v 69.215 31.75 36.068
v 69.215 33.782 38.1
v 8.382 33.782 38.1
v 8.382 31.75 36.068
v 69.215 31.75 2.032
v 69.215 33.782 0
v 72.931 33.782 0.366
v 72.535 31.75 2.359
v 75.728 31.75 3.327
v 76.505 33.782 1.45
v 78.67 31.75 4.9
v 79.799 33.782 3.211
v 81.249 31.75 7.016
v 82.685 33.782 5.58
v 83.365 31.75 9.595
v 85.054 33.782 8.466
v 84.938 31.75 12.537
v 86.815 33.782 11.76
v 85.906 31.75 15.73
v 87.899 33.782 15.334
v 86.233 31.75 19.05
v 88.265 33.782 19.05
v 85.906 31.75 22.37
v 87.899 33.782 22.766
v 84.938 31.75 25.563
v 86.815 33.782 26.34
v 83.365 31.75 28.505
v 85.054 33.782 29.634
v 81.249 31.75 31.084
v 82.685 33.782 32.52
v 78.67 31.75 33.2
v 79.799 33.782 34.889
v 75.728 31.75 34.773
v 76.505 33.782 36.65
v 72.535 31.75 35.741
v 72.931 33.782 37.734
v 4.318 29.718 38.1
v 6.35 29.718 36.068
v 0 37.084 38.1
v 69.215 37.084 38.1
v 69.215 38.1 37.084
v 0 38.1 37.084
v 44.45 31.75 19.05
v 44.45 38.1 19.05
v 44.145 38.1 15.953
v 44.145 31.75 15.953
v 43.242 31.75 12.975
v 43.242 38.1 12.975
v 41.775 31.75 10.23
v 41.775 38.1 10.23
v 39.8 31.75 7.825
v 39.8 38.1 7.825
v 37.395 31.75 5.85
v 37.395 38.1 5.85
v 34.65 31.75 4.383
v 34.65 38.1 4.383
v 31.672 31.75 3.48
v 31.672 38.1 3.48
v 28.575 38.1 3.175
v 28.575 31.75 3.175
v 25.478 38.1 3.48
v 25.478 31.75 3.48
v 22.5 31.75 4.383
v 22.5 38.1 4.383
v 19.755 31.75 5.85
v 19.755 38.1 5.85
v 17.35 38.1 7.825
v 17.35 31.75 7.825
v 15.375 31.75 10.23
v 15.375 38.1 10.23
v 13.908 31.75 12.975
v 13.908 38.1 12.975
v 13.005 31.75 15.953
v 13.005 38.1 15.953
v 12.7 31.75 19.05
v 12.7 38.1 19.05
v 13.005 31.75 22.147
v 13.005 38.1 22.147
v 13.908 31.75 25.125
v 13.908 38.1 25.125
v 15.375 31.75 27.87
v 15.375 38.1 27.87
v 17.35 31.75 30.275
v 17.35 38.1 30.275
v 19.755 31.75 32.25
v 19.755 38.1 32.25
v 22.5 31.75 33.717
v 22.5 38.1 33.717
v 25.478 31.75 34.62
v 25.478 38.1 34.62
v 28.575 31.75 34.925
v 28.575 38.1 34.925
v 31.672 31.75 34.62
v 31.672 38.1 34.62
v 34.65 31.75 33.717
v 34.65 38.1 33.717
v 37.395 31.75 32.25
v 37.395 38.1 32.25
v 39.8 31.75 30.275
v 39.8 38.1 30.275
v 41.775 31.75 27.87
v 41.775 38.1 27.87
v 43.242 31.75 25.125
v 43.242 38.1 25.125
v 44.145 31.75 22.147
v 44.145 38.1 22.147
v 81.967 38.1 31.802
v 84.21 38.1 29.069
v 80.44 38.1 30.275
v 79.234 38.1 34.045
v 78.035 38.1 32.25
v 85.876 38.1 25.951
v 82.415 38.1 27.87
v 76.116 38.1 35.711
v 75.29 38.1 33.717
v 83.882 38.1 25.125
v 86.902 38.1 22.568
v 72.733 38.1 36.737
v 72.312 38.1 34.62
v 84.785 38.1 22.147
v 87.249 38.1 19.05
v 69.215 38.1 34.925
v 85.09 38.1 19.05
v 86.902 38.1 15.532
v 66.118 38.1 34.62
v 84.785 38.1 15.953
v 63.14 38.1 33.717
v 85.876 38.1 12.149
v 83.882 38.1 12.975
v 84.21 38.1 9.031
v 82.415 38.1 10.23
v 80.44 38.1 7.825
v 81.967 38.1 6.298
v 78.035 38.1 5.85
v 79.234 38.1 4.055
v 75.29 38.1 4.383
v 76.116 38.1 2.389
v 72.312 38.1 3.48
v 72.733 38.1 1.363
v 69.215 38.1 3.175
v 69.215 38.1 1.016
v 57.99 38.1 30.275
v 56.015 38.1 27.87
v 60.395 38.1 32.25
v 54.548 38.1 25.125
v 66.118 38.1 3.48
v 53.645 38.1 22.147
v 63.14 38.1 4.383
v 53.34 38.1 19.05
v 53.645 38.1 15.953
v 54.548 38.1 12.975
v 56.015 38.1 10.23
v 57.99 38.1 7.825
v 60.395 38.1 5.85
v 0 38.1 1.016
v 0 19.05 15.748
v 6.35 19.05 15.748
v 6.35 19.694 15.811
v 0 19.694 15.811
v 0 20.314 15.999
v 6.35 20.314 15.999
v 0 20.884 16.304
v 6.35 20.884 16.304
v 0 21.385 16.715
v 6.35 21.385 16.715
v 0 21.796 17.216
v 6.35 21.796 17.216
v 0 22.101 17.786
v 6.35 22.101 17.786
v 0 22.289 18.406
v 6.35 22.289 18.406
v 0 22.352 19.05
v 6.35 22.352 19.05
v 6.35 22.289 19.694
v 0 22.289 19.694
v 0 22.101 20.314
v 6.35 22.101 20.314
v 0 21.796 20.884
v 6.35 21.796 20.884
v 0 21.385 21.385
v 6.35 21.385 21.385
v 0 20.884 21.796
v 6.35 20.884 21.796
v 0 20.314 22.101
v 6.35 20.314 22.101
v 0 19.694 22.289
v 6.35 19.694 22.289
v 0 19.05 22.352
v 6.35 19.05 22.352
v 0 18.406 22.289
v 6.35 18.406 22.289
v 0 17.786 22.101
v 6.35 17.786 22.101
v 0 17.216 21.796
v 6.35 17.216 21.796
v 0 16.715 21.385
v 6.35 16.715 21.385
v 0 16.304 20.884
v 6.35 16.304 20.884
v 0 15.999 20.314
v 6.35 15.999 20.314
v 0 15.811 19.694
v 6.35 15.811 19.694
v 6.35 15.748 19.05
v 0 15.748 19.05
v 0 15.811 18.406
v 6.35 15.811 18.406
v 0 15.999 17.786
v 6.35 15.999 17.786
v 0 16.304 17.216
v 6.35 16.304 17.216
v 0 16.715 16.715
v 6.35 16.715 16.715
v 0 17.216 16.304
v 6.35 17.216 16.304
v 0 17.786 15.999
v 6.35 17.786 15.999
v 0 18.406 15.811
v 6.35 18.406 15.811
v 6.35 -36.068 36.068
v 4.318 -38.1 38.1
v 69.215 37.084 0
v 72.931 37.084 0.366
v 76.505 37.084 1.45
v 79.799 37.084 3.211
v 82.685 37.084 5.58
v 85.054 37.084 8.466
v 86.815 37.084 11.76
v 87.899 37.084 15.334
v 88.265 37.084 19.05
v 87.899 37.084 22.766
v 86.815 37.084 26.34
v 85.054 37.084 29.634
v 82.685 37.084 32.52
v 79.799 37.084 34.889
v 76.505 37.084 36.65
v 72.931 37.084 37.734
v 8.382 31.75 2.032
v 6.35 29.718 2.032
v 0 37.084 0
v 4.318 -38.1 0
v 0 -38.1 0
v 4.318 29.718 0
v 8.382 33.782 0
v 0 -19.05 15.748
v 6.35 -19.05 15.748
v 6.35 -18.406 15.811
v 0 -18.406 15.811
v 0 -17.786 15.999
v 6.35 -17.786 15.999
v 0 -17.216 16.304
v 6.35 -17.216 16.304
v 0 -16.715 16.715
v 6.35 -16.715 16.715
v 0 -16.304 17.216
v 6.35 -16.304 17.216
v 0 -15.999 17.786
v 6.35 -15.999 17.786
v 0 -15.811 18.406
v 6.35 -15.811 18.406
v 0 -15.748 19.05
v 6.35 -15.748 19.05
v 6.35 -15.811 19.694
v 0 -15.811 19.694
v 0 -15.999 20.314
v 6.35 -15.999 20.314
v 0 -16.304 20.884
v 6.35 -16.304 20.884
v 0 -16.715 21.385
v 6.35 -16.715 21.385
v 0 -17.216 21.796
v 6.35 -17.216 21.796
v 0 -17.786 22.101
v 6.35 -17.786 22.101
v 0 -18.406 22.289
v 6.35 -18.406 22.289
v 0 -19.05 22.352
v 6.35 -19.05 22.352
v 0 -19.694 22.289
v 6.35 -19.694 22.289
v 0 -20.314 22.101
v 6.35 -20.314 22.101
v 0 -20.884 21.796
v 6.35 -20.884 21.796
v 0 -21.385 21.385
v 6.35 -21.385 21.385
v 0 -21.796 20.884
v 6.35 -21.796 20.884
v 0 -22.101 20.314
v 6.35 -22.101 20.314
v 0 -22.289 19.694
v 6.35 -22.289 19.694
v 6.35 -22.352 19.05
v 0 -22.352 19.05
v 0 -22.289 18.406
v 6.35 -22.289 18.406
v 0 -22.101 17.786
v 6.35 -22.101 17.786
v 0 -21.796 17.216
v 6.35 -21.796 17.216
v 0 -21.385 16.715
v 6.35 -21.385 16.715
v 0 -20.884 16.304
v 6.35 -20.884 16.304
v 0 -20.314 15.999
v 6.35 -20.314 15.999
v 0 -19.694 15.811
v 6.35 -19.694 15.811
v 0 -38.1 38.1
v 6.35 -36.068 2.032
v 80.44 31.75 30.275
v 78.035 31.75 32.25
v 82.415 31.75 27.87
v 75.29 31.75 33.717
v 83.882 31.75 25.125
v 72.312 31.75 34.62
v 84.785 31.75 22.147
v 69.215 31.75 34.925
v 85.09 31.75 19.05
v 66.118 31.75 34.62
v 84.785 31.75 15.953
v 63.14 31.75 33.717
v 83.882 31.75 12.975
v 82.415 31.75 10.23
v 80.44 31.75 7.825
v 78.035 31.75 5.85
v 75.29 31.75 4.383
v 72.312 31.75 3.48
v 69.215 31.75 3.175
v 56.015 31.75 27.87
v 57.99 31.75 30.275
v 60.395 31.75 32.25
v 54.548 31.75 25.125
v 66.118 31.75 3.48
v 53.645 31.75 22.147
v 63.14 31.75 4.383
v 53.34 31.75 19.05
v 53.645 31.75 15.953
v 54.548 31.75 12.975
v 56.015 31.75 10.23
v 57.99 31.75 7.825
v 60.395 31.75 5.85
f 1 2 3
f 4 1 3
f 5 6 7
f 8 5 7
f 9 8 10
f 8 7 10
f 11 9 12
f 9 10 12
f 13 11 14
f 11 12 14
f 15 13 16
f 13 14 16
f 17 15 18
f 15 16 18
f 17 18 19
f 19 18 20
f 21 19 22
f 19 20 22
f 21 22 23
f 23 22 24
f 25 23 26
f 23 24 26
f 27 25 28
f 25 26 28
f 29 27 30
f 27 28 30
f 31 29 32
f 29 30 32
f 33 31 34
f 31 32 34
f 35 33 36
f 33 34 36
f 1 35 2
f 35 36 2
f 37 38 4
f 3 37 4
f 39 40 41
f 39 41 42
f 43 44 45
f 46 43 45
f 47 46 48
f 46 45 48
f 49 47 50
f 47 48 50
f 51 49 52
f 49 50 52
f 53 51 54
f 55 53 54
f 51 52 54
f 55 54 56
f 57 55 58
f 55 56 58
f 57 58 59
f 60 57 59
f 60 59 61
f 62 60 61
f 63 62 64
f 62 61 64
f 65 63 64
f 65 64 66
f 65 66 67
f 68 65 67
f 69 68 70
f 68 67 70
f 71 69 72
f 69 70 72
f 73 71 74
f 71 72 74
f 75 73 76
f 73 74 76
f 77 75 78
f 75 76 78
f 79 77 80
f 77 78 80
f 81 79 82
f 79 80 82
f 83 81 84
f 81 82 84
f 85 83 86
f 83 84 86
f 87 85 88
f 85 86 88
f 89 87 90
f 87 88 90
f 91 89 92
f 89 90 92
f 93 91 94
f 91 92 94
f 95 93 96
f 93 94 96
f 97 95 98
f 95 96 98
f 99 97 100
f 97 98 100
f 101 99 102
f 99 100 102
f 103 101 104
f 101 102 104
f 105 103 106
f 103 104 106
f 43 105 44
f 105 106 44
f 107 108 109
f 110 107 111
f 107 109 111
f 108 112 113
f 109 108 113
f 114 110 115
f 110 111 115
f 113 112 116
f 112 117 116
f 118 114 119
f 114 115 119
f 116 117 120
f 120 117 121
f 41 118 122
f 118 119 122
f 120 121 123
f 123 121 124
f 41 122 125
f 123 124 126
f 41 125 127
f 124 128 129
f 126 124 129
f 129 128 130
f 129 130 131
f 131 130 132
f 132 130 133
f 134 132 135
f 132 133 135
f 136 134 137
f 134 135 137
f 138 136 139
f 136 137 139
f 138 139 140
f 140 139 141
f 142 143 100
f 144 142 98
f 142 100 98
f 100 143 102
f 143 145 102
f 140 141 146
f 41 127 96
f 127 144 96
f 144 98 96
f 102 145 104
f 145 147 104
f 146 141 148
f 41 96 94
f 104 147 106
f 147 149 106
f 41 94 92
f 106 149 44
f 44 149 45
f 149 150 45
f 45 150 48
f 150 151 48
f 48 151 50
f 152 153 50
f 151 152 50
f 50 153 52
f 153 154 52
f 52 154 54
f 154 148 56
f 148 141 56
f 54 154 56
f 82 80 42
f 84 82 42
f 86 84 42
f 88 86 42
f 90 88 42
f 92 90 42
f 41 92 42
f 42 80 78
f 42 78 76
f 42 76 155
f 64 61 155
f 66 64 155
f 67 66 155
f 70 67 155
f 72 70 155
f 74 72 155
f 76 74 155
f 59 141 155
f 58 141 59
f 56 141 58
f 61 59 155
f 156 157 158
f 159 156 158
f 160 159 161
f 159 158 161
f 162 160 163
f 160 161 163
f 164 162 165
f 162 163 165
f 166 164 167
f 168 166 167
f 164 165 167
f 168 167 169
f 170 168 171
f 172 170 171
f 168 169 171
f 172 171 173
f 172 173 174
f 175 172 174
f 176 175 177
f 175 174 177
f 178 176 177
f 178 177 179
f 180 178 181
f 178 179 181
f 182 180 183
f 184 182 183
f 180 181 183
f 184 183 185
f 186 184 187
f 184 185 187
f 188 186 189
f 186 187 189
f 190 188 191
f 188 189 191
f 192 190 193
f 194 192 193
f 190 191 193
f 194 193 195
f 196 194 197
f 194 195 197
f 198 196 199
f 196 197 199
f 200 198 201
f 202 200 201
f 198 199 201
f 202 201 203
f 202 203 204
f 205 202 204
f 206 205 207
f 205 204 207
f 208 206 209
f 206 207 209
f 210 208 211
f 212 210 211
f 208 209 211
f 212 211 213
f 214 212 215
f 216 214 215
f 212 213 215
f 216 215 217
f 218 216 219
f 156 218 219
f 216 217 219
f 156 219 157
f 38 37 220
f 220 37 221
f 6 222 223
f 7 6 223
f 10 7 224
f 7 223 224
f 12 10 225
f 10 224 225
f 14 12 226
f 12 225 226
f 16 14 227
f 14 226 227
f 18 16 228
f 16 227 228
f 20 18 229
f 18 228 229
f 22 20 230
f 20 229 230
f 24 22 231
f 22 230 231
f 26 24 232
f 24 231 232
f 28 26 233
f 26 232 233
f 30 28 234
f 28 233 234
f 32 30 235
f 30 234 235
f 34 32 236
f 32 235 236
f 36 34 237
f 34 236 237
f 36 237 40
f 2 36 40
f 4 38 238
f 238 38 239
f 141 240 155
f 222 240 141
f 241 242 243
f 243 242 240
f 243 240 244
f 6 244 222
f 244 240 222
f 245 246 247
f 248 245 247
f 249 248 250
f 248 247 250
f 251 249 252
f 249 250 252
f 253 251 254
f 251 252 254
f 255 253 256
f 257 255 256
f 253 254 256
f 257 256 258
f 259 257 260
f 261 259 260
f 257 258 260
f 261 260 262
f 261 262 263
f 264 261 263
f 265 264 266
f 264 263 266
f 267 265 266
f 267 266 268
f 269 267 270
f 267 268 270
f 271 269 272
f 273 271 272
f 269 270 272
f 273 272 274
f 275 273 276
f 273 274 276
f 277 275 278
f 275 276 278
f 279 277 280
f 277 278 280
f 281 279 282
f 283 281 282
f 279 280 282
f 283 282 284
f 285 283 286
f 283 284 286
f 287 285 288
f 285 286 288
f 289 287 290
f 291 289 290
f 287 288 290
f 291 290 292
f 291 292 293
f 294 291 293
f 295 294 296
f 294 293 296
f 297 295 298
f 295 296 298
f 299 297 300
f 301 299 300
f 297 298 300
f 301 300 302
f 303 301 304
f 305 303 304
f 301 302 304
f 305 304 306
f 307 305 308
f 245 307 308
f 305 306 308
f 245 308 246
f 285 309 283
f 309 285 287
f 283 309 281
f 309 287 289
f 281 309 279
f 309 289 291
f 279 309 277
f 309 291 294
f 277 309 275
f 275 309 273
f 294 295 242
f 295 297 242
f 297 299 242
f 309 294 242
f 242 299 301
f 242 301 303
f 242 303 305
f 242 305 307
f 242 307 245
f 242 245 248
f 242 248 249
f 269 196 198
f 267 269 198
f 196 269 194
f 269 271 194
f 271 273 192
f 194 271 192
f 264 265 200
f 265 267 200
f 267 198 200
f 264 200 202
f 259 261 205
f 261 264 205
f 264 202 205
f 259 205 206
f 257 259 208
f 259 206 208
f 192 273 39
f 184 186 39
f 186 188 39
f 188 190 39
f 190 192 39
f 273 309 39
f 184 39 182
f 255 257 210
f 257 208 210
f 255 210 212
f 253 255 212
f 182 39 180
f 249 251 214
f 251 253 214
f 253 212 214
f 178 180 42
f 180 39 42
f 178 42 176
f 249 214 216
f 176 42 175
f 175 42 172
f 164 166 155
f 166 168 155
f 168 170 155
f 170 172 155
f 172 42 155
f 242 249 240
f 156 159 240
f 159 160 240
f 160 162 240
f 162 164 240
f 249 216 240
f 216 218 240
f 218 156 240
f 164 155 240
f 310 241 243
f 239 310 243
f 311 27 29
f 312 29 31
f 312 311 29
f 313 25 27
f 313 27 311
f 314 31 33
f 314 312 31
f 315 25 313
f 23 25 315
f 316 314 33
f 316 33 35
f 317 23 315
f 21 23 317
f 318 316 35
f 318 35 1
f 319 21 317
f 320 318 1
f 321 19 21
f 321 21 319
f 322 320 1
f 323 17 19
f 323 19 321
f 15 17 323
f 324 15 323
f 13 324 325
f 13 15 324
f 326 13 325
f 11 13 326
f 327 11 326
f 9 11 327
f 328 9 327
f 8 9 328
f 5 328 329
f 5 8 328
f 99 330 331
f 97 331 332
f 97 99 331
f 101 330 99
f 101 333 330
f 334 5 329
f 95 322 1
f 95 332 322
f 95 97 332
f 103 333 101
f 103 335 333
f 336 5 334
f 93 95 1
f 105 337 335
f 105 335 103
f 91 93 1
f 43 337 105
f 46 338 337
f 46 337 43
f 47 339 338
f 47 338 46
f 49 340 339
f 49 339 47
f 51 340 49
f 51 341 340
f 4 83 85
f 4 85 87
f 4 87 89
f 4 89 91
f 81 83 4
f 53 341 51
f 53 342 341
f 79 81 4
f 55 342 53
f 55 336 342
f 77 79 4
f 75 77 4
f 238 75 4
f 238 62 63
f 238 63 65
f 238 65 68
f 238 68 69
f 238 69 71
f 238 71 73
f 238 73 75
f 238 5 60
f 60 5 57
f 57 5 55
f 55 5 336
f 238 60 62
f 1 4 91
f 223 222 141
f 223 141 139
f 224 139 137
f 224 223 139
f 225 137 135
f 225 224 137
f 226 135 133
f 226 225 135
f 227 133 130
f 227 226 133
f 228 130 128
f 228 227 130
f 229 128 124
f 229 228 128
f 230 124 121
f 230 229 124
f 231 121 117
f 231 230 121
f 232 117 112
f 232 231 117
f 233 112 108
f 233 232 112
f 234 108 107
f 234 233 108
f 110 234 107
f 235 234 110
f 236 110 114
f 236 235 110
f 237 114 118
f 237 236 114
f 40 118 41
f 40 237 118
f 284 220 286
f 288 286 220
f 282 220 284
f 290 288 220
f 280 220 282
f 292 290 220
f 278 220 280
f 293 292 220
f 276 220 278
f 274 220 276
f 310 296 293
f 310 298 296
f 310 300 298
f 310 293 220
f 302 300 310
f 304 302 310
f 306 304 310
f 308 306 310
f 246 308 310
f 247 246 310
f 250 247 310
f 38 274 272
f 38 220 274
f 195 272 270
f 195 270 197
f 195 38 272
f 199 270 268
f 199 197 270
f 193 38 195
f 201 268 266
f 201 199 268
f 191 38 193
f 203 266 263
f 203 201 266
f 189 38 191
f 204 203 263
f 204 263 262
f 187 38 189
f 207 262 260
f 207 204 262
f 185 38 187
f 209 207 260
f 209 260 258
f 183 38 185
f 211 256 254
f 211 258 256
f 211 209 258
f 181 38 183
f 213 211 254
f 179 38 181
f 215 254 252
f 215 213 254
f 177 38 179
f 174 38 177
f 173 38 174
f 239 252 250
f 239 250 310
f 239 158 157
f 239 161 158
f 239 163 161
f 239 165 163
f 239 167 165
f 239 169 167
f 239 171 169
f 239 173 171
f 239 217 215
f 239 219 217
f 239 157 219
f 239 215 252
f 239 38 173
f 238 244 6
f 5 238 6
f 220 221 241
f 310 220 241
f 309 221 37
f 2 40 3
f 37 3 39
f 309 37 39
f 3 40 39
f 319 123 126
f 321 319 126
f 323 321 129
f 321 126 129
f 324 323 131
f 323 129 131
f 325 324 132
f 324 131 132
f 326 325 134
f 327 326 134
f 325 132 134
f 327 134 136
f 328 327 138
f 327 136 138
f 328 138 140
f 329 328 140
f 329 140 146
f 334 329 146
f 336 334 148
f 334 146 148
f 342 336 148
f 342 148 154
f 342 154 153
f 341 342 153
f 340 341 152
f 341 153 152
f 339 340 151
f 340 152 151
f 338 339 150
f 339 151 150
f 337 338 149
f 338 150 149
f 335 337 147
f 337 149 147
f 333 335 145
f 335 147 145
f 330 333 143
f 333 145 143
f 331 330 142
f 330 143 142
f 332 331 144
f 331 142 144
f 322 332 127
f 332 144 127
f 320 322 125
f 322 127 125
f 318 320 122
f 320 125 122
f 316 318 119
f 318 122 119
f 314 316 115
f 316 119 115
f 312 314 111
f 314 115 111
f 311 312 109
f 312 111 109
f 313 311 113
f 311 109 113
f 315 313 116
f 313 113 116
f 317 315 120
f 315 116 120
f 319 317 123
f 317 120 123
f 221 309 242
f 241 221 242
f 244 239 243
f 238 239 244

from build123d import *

# Parameters (mm, degrees)
SKETCH1_W           = 38.1
SKETCH1_H           = 38.1
BOSS_EXTRUDE1_DEPTH = 6.35
SKETCH2_R           = 3.302
CUT_EXTRUDE1_DEPTH  = 6.35
SKETCH3_R           = 3.302
CUT_EXTRUDE2_DEPTH  = 6.35
SKETCH4_R           = 15.875
BOSS_EXTRUDE2_DEPTH = 6.35
CHAMFER1_SIZE       = 2.032
CHAMFER2_SIZE       = 1.016


with BuildPart() as part:
    # Sketch1 → Boss-Extrude1 (new body)
    with BuildSketch(Plane(origin=(0, 0, 0), x_dir=(0, 0, -1), z_dir=(1, 0, 0))):
        with Locations((-19.05, 19.05)):
            Rectangle(SKETCH1_W, SKETCH1_H)
        with Locations((-19.05, -19.05)):
            Rectangle(SKETCH1_W, SKETCH1_H)
    extrude(amount=BOSS_EXTRUDE1_DEPTH)

    # Sketch2 → Cut-Extrude1 (cut)
    with BuildSketch(Plane(origin=(6.35, 0, 0), x_dir=(0, 0, -1), z_dir=(1, 0, 0))):
        with Locations((-19.05, -19.05)):
            Circle(SKETCH2_R)
    extrude(amount=-CUT_EXTRUDE1_DEPTH, mode=Mode.SUBTRACT)

    # Sketch3 → Cut-Extrude2 (cut)
    with BuildSketch(Plane(origin=(6.35, 0, 0), x_dir=(0, 0, -1), z_dir=(1, 0, 0))):
        with Locations((-19.05, 19.05)):
            Circle(SKETCH3_R)
    extrude(amount=-CUT_EXTRUDE2_DEPTH, mode=Mode.SUBTRACT)

    # Sketch4 → Boss-Extrude2 (add)
    with BuildSketch(Plane(origin=(0, 38.1, 0), x_dir=(1, 0, 0), z_dir=(0, 1, 0))):
        with BuildLine():
            ThreePointArc((69.215, 0), (88.265, -19.05), (69.215, -38.1))
            Line((69.215, -38.1), (28.575, -38.1))
            Line((28.575, -38.1), (6.35, -38.1))
            Line((6.35, -38.1), (6.35, 0))
            Line((6.35, 0), (28.575, 0))
            Line((28.575, 0), (69.215, 0))
        make_face()
        with Locations((69.215, -19.05)):
            Circle(SKETCH4_R, mode=Mode.SUBTRACT)
        with Locations((28.575, -19.05)):
            Circle(SKETCH4_R, mode=Mode.SUBTRACT)
    extrude(amount=-BOSS_EXTRUDE2_DEPTH)

    # Chamfer1
    chamfer1_edges = [part.edges().sort_by_distance(p)[0] for p in [
        (6.35, -38.1, 19.05),
        (6.35, -3.175, 0),
        (6.35, -3.175, 38.1),
        (37.7825, 31.75, 38.1),
        (88.265, 31.75, 19.05),
        (6.35, 31.75, 19.05),
        (37.7825, 31.75, 0),
    ]]
    chamfer(chamfer1_edges, length=CHAMFER1_SIZE)

    # Chamfer2
    chamfer2_edges = [part.edges().sort_by_distance(p)[0] for p in [
        (34.6075, 38.1, 38.1),
        (88.265, 38.1, 19.05),
        (34.6075, 38.1, 0),
    ]]
    chamfer(chamfer2_edges, length=CHAMFER2_SIZE)


solid = part.part
